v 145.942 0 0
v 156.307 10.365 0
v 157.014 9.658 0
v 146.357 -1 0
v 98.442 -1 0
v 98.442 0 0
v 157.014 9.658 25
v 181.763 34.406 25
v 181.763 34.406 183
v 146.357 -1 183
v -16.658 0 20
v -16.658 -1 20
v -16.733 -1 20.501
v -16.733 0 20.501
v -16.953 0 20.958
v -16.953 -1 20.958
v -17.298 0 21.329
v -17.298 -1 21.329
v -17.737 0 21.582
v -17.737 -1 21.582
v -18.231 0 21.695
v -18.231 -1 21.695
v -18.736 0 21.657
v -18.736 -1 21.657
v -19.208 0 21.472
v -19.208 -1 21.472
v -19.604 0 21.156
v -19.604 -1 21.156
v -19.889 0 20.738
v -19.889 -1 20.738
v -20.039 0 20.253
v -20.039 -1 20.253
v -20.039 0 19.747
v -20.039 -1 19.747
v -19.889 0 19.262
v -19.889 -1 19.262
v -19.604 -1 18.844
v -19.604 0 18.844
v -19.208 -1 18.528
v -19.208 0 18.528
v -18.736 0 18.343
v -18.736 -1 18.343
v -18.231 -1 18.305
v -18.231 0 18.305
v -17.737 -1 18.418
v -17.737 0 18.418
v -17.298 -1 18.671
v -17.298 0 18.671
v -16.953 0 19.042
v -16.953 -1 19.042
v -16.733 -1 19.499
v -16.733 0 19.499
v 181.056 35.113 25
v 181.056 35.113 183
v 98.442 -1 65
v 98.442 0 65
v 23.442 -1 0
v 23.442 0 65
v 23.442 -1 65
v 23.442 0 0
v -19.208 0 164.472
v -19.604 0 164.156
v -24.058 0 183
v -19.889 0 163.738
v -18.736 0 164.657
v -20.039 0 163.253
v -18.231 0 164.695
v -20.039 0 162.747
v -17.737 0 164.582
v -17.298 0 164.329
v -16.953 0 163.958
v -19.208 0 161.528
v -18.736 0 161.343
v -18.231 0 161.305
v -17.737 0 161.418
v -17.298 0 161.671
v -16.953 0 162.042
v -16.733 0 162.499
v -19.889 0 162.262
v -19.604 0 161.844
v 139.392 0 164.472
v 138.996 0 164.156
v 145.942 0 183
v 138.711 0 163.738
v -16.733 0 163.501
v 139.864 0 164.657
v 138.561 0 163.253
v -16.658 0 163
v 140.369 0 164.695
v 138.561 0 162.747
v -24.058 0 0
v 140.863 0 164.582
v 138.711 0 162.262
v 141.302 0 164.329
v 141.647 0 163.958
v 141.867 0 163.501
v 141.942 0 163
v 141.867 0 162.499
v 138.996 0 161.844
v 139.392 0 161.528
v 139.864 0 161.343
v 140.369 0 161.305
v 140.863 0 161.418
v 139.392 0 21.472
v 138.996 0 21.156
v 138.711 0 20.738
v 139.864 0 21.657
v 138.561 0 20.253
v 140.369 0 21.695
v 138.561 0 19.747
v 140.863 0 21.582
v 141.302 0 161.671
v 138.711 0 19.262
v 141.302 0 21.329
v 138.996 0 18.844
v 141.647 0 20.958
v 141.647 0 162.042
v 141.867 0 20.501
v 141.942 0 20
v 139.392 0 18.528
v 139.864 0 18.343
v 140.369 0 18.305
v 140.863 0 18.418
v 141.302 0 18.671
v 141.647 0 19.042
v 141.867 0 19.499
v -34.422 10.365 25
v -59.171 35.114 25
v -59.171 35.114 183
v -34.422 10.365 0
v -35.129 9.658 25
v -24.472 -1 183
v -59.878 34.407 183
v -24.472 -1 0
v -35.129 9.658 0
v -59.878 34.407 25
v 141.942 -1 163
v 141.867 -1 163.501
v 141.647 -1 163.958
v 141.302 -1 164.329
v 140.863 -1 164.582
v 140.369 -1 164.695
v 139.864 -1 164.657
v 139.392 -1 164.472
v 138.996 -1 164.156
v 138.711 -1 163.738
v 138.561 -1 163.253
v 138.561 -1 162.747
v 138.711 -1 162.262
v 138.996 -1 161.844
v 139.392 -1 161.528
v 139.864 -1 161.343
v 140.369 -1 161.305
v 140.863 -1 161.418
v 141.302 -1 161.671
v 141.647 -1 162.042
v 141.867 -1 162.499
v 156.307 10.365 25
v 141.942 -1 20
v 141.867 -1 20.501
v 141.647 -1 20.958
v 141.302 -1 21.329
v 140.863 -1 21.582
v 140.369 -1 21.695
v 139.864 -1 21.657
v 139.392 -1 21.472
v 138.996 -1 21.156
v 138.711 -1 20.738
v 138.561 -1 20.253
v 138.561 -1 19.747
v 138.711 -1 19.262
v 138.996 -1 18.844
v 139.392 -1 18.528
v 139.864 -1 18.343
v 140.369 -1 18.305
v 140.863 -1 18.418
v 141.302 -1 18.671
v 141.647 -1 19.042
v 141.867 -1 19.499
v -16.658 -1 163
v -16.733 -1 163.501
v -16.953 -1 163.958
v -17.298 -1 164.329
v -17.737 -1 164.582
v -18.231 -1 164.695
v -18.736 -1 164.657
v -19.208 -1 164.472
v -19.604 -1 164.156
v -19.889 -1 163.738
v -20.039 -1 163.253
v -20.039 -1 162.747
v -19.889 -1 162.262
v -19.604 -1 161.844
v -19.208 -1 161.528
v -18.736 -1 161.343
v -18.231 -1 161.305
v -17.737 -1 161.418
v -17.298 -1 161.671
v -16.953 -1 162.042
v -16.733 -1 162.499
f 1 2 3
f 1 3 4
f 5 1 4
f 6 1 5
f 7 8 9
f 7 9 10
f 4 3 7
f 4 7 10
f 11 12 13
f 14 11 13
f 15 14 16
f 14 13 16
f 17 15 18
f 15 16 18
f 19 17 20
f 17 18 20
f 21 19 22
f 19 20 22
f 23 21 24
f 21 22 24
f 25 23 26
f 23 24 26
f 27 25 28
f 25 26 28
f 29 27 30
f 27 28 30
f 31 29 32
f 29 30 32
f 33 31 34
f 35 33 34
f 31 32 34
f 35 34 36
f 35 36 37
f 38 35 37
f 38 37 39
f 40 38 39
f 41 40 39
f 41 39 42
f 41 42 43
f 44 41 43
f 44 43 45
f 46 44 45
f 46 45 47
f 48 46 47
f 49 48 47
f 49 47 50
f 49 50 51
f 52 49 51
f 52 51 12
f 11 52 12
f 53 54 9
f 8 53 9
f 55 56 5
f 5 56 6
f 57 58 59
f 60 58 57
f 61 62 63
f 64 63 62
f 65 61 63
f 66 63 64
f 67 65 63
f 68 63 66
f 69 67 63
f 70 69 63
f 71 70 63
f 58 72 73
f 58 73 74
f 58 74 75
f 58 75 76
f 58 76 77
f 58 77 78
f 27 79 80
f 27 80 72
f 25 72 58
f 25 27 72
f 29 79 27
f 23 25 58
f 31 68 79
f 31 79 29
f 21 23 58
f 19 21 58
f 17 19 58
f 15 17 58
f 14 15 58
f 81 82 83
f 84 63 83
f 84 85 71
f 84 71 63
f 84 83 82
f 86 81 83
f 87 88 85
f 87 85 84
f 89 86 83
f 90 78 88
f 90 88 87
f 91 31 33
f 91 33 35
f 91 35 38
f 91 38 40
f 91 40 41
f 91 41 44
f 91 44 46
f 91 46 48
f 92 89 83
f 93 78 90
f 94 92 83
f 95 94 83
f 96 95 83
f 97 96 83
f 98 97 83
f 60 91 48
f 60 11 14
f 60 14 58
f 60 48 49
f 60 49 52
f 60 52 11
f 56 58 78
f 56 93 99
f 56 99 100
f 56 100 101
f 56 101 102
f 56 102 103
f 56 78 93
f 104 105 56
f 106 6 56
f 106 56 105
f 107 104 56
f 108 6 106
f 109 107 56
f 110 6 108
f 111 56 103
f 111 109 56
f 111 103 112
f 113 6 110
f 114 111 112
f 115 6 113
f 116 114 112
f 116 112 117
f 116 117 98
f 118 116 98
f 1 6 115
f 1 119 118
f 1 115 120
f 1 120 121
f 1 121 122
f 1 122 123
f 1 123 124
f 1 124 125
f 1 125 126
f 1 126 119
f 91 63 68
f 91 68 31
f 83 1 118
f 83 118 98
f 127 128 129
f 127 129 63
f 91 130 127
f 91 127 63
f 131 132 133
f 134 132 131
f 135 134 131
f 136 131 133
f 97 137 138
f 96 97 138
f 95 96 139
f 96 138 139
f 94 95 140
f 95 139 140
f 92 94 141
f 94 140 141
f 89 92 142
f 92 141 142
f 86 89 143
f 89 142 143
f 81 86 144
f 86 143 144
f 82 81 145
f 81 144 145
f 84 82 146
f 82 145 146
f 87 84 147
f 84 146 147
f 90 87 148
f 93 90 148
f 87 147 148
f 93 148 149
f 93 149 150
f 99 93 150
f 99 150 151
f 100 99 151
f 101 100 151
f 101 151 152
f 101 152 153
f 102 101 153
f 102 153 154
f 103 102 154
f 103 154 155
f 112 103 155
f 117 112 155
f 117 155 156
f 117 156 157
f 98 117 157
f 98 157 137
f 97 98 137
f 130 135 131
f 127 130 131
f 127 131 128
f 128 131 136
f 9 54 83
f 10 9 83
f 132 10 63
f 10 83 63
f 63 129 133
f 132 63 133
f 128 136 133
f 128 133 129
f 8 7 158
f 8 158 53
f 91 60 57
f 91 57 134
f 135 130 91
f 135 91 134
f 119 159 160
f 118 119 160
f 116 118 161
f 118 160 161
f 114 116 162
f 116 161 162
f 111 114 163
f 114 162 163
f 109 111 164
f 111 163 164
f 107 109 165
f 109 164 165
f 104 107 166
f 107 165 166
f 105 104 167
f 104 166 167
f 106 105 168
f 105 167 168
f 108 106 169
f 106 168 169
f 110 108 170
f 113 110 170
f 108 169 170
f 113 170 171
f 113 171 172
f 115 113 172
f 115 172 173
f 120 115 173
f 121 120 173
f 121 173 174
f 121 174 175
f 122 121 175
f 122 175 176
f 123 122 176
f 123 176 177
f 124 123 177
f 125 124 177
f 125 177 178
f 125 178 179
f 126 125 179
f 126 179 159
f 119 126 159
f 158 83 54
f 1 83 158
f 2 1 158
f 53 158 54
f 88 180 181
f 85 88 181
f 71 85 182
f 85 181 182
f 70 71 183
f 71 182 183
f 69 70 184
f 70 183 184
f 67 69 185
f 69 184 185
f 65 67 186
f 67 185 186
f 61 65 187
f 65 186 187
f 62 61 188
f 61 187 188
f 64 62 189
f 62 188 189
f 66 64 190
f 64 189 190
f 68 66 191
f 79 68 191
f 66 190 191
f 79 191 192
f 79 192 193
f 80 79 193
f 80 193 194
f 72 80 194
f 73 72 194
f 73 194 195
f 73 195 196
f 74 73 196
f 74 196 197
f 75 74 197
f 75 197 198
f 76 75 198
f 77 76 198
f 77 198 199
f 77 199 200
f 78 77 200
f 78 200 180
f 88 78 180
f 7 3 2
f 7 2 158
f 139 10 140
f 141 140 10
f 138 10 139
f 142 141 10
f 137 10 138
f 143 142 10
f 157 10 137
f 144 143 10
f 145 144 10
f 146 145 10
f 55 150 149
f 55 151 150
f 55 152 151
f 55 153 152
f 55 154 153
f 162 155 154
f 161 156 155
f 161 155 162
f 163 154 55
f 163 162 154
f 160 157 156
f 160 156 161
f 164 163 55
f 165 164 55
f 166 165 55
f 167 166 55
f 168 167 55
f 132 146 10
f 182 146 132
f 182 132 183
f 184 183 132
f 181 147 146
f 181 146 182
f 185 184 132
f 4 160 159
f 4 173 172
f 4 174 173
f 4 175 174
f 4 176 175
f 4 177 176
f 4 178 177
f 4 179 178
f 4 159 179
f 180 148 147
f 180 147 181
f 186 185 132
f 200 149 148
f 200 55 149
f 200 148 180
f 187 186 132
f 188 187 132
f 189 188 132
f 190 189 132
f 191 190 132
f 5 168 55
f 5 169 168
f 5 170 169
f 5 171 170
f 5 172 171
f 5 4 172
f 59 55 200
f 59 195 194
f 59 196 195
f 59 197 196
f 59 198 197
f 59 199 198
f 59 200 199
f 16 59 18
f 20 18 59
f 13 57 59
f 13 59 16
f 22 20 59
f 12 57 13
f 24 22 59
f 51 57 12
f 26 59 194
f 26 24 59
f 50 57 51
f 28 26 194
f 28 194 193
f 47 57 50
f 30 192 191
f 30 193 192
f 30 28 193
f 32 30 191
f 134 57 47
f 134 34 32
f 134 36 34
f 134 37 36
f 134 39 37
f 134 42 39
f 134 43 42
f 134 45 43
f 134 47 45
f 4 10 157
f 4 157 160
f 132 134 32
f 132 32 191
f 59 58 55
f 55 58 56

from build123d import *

# Parameters (mm, degrees)
EXTRU_MINCE1_DEPTH      = 183
ESQUISSE8_W             = 75
ESQUISSE8_H             = 65
ENL_V_MAT_EXTRU_2_DEPTH = 1
D_GAGEMENT_M32_D        = 3.4
ENL_V_MAT_EXTRU_3_REACH = 173.369
ESQUISSE15_W            = 25
ESQUISSE15_H            = 35
ENL_V_MAT_EXTRU_4_REACH = 173.364
ESQUISSE16_W            = 35
ESQUISSE16_H            = 25


with BuildPart() as part:
    # Esquisse2 → Extru.-Mince1 (new body)
    with BuildSketch(Plane.XY):
        Polygon((-59.170699115, 35.114), (-24.057682042, 0), (145.942317958, 0), (181.056317958, 35.113017073), (181.763414842, 34.405900395), (146.356523321, -1), (-24.471903803, -1), (-59.877815794, 34.406903116), align=None)
    extrude(amount=EXTRU_MINCE1_DEPTH)

    # Esquisse8 → Enlèv. mat.-Extru.2 (cut)
    with BuildSketch(Plane(origin=(0, 0, 0), x_dir=(1, 0, 0), z_dir=(0, 1, 0))):
        with Locations((60.942317958, -32.5)):
            Rectangle(ESQUISSE8_W, ESQUISSE8_H)
    extrude(amount=-ENL_V_MAT_EXTRU_2_DEPTH, mode=Mode.SUBTRACT)

    # Dégagement M32 (through all)
    with Locations(Plane(origin=(0, 0, 0), x_dir=(-1, 0, 0), z_dir=(0, 1, 0))):
        with Locations((18.357682042, 20), (-140.242317958, 20), (-140.242317958, 163), (18.357682042, 163)):
            Hole(D_GAGEMENT_M32_D / 2)

    # Esquisse15 → Enlèv. mat.-Extru.3 (cut, up to next)
    with BuildSketch(Plane(origin=(-12.73629442, -12.7359379, 0), x_dir=(0, 0, 1), z_dir=(-0.707116678, -0.707096884, 0)), mode=Mode.PRIVATE) as enl_v_mat_extru_3_sk1:
        with Locations((12.5, 49.169112012)):
            Rectangle(ESQUISSE15_W, ESQUISSE15_H)
    enl_v_mat_extru_3_tool1 = extrude(enl_v_mat_extru_3_sk1.sketch, amount=-ENL_V_MAT_EXTRU_3_REACH, mode=Mode.PRIVATE) & part.part
    add(enl_v_mat_extru_3_tool1.solids().sort_by_distance((-47.50362, 22.032361, 12.5))[0], mode=Mode.SUBTRACT)

    # Esquisse16 → Enlèv. mat.-Extru.4 (cut, up to next)
    with BuildSketch(Plane(origin=(73.676213194, -73.678275628, 0), x_dir=(0.707116678, 0.707096884, 0), z_dir=(0.707096884, -0.707116678, 0)), mode=Mode.PRIVATE) as enl_v_mat_extru_4_sk1:
        with Locations((135.356247065, 12.5)):
            Rectangle(ESQUISSE16_W, ESQUISSE16_H)
    enl_v_mat_extru_4_tool1 = extrude(enl_v_mat_extru_4_sk1.sketch, amount=-ENL_V_MAT_EXTRU_4_REACH, mode=Mode.PRIVATE) & part.part
    add(enl_v_mat_extru_4_tool1.solids().sort_by_distance((169.388873, 22.031705, 12.5))[0], mode=Mode.SUBTRACT)


solid = part.part
